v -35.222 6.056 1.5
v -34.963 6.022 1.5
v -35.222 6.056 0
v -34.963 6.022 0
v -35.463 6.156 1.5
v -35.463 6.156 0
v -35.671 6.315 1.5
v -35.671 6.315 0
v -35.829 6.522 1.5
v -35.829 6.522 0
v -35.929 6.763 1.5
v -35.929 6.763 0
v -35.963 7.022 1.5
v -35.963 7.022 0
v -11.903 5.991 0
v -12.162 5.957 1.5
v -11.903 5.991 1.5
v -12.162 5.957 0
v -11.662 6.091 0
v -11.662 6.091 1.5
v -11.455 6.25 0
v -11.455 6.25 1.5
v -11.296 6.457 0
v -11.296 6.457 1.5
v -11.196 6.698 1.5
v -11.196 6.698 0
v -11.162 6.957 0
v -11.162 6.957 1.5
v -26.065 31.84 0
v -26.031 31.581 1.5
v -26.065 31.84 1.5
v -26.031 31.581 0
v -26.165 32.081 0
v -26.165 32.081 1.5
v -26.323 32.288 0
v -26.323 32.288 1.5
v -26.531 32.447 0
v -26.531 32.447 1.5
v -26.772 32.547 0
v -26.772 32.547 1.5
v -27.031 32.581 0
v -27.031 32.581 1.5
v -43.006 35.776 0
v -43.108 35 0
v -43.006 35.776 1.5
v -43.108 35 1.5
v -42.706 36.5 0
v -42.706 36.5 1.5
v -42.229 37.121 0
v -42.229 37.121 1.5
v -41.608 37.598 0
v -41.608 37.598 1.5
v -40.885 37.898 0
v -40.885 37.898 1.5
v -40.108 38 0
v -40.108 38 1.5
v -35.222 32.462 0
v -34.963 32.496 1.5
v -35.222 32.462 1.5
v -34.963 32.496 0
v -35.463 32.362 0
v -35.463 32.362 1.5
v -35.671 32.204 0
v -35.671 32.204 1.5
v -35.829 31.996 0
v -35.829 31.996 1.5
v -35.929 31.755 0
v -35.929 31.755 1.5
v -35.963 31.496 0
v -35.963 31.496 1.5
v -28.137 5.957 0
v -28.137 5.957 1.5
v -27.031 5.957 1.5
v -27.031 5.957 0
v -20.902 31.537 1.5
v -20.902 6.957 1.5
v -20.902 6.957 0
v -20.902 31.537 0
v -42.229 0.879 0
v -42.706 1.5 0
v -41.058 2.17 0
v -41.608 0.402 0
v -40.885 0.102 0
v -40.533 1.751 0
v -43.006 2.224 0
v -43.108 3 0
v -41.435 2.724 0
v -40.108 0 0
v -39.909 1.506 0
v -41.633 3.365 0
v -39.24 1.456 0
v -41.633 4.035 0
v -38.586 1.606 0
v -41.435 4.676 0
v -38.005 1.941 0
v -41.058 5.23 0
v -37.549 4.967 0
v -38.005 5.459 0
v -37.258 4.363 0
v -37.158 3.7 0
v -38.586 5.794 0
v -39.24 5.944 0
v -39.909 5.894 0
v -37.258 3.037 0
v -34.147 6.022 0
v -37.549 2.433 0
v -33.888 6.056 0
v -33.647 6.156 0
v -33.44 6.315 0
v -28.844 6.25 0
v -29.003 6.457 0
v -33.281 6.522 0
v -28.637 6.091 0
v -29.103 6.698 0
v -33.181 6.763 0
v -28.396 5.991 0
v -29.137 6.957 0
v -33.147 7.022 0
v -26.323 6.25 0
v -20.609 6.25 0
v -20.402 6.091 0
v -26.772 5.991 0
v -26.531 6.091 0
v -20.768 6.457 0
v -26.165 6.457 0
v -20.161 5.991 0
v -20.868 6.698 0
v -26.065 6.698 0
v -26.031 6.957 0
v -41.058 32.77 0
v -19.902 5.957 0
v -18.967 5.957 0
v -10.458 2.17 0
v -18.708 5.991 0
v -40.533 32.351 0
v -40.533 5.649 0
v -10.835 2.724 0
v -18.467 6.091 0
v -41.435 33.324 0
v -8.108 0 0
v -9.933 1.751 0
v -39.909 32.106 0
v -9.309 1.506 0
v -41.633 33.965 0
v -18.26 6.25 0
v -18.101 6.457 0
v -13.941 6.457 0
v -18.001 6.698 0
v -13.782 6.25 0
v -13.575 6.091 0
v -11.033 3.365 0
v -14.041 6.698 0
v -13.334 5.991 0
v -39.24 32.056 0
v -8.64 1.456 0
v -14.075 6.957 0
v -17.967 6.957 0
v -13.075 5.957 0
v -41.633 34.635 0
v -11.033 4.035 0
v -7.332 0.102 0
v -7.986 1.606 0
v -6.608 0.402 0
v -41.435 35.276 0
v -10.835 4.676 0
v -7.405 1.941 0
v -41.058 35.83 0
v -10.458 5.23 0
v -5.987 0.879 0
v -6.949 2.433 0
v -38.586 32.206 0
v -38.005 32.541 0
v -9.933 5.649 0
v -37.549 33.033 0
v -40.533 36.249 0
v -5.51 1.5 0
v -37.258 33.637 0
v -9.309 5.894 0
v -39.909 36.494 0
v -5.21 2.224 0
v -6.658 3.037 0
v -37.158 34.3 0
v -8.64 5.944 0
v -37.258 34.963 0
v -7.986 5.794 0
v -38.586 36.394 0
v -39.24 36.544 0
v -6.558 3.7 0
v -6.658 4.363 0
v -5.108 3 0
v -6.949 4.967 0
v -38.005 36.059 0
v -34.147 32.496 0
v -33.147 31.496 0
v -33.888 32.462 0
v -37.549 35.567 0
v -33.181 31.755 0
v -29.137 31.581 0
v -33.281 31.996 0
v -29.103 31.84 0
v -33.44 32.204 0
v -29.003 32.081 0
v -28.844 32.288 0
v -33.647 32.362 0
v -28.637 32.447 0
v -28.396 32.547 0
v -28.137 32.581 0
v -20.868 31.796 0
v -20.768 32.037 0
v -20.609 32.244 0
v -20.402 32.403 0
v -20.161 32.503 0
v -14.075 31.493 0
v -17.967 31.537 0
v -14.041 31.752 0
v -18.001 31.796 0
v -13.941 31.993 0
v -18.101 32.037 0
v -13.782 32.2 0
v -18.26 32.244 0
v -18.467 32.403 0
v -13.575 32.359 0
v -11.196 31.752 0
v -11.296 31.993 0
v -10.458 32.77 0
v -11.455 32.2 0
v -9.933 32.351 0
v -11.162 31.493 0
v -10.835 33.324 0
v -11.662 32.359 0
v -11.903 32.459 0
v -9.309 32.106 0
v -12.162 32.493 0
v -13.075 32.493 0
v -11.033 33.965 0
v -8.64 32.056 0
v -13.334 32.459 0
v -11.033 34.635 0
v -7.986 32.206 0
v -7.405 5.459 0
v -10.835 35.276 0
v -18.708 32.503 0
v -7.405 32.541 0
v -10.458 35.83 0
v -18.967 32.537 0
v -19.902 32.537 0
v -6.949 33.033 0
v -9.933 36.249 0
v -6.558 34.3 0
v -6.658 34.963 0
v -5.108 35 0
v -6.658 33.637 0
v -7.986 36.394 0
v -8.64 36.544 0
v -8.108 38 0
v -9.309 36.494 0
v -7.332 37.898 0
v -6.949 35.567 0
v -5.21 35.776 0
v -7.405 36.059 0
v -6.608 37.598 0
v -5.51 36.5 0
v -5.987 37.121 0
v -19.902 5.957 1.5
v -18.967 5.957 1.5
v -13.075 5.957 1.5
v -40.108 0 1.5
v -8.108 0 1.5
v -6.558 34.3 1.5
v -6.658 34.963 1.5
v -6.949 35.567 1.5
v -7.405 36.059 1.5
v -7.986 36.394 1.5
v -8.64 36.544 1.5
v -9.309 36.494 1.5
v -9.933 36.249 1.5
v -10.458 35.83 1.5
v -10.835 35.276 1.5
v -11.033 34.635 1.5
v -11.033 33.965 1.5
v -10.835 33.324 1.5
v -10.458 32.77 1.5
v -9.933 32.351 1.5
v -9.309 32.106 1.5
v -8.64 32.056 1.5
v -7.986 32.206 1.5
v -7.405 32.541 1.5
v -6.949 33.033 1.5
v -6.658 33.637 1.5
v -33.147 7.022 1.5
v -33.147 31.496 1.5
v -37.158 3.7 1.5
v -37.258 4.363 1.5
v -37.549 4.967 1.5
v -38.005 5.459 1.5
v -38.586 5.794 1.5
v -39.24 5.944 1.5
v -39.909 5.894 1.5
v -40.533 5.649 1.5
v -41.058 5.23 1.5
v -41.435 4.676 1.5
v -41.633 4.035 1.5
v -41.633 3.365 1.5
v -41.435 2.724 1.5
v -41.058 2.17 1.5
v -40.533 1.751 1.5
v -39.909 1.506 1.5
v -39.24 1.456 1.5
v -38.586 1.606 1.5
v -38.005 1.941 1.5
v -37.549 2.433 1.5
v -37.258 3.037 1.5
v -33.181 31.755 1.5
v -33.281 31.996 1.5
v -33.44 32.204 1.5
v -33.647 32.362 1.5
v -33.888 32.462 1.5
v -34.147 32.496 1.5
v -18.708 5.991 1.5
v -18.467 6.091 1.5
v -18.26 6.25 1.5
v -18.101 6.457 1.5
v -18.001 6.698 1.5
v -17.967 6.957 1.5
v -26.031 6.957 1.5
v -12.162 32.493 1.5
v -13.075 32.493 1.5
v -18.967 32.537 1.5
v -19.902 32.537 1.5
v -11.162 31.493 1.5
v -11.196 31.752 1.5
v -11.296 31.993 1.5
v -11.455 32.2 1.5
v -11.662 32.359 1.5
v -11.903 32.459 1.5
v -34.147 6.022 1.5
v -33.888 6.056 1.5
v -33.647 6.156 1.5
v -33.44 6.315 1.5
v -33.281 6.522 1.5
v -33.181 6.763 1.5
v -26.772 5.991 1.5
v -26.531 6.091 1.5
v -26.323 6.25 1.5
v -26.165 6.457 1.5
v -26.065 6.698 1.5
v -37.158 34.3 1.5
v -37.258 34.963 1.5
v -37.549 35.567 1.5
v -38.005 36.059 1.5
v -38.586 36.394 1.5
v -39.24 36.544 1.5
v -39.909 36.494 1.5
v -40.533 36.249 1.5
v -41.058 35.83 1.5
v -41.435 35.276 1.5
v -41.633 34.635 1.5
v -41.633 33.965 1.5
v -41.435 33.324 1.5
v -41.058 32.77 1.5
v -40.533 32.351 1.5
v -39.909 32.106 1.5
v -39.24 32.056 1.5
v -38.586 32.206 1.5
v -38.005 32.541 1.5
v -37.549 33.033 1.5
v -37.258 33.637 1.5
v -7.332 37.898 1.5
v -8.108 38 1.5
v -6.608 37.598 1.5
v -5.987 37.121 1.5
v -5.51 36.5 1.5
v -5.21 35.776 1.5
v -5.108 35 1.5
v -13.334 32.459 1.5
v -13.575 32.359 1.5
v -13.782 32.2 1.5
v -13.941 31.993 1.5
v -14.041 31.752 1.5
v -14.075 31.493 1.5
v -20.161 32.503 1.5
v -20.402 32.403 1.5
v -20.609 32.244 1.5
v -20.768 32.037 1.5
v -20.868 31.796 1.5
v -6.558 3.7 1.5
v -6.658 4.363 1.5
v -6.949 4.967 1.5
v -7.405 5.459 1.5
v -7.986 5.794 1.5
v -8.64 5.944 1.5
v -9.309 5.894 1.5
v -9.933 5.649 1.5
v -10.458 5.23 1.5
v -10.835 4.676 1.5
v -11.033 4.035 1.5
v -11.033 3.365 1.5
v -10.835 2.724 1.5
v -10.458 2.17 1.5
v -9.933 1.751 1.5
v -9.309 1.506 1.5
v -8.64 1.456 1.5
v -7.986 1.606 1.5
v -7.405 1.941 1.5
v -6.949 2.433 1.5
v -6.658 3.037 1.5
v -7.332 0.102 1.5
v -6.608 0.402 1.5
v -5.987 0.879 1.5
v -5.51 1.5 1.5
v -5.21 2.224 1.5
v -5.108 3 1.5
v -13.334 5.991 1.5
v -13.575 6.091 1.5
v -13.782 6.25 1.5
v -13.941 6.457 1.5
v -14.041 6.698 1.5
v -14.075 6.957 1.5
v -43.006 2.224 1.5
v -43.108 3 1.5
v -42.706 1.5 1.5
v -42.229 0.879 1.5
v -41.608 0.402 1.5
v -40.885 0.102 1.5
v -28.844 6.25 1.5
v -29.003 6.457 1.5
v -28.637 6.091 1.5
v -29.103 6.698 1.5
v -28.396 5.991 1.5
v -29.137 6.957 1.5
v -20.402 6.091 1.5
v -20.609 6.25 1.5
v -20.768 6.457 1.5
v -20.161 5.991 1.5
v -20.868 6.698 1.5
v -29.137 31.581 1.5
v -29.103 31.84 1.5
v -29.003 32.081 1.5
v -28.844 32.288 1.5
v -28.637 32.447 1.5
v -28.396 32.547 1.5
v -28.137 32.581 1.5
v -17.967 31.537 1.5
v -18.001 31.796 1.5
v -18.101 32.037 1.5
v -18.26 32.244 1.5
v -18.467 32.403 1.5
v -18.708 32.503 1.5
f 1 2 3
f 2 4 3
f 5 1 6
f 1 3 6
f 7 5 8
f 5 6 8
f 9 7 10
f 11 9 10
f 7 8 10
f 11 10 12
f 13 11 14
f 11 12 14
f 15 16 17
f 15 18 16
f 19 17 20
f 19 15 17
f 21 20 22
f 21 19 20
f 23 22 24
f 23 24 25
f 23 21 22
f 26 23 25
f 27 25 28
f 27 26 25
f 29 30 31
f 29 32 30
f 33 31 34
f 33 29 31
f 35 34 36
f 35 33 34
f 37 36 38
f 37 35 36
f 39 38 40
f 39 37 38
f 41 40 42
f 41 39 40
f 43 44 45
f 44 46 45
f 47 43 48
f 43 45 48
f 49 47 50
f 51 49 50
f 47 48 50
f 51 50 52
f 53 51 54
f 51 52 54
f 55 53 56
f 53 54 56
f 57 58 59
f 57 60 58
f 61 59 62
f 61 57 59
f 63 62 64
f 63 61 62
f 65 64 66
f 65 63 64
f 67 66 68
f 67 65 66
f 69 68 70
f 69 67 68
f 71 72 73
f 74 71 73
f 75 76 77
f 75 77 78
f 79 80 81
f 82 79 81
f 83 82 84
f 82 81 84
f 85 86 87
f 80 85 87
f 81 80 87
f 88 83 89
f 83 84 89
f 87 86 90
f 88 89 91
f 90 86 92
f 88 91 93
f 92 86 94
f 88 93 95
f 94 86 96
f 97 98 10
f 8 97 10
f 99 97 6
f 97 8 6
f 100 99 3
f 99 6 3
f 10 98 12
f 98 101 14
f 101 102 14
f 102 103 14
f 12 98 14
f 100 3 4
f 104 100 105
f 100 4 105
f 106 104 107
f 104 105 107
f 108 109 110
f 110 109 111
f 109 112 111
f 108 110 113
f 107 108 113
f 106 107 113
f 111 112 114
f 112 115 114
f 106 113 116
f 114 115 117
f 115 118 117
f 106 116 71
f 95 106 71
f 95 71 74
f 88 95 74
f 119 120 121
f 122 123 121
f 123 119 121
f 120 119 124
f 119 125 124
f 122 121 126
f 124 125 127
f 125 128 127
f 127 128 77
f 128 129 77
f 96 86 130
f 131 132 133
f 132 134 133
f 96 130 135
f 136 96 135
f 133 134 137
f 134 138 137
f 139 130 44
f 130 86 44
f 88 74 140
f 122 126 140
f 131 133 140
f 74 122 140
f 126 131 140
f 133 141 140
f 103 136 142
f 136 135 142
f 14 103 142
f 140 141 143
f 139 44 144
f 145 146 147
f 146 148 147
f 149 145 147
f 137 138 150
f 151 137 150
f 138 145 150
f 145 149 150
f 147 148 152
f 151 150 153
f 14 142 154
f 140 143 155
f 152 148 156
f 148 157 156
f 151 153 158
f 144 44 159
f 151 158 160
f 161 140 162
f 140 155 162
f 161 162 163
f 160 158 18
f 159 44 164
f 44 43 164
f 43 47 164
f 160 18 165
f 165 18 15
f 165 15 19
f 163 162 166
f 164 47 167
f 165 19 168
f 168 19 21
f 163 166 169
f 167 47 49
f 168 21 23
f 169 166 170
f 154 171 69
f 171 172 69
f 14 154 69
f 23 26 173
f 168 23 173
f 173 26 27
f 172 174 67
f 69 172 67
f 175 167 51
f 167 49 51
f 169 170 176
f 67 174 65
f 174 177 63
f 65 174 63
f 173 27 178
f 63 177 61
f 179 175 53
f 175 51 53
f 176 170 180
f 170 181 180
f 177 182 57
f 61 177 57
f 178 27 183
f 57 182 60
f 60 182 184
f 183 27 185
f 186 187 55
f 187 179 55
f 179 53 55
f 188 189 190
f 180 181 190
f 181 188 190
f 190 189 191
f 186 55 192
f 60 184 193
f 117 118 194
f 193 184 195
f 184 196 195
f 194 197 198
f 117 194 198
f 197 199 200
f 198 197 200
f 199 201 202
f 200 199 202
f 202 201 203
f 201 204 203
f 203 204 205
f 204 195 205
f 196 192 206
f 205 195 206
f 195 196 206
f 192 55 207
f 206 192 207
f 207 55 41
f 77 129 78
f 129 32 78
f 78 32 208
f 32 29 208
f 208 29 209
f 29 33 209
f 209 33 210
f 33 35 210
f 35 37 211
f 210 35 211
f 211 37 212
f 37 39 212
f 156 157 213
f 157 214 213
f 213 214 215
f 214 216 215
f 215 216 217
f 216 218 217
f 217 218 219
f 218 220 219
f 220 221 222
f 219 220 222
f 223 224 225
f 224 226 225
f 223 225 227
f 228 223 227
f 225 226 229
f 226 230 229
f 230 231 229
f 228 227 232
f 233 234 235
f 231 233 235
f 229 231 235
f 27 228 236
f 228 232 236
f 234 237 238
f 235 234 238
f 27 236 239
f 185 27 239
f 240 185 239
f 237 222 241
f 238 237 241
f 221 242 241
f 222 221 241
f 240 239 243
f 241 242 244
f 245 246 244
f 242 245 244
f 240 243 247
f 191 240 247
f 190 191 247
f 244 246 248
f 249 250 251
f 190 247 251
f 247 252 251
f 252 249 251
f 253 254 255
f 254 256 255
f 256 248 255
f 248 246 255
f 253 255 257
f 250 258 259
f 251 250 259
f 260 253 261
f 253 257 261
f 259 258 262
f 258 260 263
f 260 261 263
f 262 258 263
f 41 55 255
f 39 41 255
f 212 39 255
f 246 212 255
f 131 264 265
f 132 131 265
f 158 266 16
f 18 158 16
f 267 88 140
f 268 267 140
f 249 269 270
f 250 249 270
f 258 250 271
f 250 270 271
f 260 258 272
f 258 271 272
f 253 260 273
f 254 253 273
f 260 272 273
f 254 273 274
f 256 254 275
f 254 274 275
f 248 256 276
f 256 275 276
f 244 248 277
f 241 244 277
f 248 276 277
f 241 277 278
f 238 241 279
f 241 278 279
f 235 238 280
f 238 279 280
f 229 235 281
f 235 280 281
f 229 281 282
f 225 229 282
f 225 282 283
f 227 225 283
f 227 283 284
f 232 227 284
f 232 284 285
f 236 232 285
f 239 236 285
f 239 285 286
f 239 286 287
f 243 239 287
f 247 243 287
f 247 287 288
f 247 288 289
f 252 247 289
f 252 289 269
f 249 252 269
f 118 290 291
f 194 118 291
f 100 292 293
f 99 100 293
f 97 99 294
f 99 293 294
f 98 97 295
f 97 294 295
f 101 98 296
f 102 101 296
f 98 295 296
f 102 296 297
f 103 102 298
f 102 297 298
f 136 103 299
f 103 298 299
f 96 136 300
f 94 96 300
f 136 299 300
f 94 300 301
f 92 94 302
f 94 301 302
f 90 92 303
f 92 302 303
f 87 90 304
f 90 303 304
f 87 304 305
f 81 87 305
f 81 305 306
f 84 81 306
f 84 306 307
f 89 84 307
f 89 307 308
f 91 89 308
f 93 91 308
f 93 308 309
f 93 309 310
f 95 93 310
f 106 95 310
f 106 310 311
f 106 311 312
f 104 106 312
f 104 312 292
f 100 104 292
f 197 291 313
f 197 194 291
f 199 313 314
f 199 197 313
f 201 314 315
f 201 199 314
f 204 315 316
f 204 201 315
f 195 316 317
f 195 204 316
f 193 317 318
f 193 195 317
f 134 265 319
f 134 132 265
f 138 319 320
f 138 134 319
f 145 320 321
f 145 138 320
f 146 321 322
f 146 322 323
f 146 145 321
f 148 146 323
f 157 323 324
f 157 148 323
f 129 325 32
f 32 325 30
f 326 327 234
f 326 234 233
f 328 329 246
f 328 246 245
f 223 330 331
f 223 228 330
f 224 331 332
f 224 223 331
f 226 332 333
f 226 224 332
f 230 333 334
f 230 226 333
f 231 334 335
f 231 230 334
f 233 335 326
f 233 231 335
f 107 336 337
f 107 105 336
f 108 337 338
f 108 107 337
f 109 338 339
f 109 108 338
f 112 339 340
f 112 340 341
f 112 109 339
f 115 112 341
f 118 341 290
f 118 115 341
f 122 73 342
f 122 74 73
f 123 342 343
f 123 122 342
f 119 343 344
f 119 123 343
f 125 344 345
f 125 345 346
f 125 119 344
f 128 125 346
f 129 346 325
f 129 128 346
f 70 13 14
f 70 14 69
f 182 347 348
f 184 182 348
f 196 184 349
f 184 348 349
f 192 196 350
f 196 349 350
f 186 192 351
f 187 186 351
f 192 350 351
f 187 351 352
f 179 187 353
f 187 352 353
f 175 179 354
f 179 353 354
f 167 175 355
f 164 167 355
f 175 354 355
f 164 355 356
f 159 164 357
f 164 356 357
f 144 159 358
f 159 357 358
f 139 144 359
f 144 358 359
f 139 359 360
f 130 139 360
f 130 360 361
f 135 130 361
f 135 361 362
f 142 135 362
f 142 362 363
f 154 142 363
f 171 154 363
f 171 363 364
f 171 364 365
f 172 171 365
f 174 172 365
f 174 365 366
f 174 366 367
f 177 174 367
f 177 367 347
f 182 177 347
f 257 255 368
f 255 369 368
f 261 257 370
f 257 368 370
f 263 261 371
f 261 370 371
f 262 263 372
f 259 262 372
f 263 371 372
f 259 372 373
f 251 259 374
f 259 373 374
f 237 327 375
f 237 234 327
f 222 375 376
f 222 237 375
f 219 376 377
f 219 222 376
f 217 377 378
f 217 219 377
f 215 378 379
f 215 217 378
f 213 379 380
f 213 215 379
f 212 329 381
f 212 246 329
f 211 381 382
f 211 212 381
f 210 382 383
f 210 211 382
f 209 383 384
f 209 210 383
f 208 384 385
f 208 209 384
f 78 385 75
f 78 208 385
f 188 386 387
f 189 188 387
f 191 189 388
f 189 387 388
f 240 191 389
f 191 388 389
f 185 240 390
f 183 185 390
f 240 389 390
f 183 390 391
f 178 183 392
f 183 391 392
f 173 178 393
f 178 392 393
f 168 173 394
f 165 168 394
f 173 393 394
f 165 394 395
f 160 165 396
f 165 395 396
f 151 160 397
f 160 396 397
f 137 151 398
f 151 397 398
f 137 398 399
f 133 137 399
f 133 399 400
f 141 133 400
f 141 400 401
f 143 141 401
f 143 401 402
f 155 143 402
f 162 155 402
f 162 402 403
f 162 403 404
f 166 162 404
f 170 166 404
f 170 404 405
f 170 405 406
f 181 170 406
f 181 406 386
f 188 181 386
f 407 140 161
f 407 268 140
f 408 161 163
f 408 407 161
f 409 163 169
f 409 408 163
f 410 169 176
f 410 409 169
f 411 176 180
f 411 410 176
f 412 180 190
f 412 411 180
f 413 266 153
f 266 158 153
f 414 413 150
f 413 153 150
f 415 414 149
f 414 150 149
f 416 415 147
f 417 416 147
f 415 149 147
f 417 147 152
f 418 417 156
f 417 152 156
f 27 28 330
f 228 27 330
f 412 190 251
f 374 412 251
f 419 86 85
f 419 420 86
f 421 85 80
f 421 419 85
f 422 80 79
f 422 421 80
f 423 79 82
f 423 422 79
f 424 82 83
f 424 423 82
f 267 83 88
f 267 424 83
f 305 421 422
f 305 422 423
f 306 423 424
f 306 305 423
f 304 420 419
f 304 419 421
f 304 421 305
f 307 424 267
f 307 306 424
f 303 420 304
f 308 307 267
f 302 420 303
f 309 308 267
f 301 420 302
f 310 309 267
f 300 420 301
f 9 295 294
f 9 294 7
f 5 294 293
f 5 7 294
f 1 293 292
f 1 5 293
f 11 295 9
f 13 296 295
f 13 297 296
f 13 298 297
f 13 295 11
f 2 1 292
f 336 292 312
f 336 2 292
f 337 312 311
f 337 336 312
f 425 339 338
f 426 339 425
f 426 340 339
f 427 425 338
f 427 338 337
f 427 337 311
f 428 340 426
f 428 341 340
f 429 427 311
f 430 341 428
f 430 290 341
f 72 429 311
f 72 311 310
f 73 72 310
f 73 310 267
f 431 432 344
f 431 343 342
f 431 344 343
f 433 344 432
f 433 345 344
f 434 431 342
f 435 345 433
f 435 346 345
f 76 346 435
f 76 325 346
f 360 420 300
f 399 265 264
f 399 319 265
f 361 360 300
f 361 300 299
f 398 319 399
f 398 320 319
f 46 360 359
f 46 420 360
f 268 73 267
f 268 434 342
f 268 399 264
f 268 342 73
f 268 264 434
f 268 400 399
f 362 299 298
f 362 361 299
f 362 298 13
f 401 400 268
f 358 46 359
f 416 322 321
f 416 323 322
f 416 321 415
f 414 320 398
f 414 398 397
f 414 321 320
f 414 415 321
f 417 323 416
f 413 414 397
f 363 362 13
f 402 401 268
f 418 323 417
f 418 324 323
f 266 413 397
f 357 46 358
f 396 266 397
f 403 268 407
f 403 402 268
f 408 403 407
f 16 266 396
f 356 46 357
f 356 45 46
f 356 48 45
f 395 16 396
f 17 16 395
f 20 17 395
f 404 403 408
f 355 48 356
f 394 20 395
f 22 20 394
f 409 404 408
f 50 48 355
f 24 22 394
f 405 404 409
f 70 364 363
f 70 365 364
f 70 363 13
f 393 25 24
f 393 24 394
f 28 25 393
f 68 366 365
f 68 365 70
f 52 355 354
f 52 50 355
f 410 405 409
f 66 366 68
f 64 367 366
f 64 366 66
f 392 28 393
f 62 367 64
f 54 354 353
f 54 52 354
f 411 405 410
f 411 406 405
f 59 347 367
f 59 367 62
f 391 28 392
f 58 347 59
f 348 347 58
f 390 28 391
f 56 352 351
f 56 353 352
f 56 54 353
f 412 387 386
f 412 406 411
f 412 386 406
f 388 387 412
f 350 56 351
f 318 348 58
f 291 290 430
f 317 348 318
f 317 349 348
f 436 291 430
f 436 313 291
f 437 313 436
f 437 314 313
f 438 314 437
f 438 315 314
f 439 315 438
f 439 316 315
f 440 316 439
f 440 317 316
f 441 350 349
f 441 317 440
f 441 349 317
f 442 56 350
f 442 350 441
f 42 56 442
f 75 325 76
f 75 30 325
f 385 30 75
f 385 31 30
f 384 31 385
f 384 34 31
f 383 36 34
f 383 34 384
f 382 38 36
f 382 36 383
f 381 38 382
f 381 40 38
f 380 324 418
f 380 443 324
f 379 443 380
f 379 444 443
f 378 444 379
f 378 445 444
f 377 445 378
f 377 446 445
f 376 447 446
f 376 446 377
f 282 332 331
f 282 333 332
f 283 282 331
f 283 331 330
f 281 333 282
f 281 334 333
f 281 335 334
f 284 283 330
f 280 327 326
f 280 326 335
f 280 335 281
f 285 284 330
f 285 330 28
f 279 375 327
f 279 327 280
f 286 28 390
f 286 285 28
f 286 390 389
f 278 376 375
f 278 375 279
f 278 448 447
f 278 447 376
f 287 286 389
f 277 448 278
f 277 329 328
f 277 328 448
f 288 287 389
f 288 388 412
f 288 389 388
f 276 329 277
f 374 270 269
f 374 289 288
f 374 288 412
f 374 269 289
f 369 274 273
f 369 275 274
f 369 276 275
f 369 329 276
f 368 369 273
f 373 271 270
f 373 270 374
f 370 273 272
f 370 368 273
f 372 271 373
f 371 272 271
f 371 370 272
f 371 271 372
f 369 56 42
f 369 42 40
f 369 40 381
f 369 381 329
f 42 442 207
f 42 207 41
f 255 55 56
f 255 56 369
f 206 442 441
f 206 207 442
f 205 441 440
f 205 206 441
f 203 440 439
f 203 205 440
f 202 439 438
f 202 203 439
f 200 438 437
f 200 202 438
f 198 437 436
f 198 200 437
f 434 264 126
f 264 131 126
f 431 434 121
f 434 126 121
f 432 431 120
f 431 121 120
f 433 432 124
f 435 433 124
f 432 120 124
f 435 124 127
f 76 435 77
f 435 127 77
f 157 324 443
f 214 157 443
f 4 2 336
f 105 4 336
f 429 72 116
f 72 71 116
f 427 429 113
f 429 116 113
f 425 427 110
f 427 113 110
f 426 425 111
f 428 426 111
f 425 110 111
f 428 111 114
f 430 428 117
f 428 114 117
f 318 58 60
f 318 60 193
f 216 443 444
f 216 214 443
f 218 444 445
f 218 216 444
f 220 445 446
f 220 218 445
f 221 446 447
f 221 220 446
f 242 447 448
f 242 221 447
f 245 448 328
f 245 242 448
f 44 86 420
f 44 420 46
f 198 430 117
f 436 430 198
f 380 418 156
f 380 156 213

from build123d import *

# Parameters (mm, degrees)
F0_W     = 38
F0_H     = 38
F1_DEPTH = 1.5
F2_R     = 2.25
F2_W     = 2.816632
F2_H     = 26.474444
F2_W_2   = 3.106516
F2_H_2   = 26.623748
F2_W_3   = 2.935091
F2_H_3   = 26.58009
F2_W_4   = 2.913202
F2_H_4   = 26.536286
F3_DEPTH = 1.501
F4_R     = 3
F5_R     = 1


with BuildPart() as f1:
    # F0 (on Top) → F1 (new body)
    with BuildSketch(Plane.XY):
        with Locations((-24.108174, 19)):
            Rectangle(F0_W, F0_H)
    extrude(amount=F1_DEPTH)

    # F2 (on face) → F3 (cut, through all)
    with BuildSketch(Plane.XY.offset(1.5)):
        with Locations((-39.408174, 34.3)):
            Circle(F2_R)
        with Locations((-8.808174, 34.3)):
            Circle(F2_R)
        with Locations((-8.808174, 3.7)):
            Circle(F2_R)
        with Locations((-39.408174, 3.7)):
            Circle(F2_R)
        with Locations((-34.555089, 19.259251)):
            Rectangle(F2_W, F2_H)
        with Locations((-27.583793, 19.268872)):
            Rectangle(F2_W_2, F2_H_2)
        with Locations((-19.434359, 19.247043)):
            Rectangle(F2_W_3, F2_H_3)
        with Locations((-12.618669, 19.225141)):
            Rectangle(F2_W_4, F2_H_4)
    extrude(amount=-F3_DEPTH, mode=Mode.SUBTRACT)

    # F4
    f4_edges = [f1.edges().sort_by_distance(p)[0] for p in [
        (-43.108174, 38, 0.75),
        (-5.108174, 38, 0.75),
        (-5.108174, 0, 0.75),
        (-43.108174, 0, 0.75),
    ]]
    fillet(f4_edges, radius=F4_R)

    # F5
    f5_edges = [f1.edges().sort_by_distance(p)[0] for p in [
        (-35.963405, 32.496473, 0.75),
        (-35.963405, 6.022029, 0.75),
        (-29.137051, 5.956998, 0.75),
        (-20.901905, 5.956998, 0.75),
        (-14.07527, 5.956998, 0.75),
        (-11.162068, 5.956998, 0.75),
        (-17.966814, 5.956998, 0.75),
        (-26.030535, 5.956998, 0.75),
        (-33.146773, 6.022029, 0.75),
        (-11.162068, 32.493284, 0.75),
        (-17.966814, 32.537088, 0.75),
        (-26.030535, 32.580746, 0.75),
        (-33.146773, 32.496473, 0.75),
        (-29.137051, 32.580746, 0.75),
        (-20.901905, 32.537088, 0.75),
        (-14.07527, 32.493284, 0.75),
    ]]
    fillet(f5_edges, radius=F5_R)


solid = f1.part
